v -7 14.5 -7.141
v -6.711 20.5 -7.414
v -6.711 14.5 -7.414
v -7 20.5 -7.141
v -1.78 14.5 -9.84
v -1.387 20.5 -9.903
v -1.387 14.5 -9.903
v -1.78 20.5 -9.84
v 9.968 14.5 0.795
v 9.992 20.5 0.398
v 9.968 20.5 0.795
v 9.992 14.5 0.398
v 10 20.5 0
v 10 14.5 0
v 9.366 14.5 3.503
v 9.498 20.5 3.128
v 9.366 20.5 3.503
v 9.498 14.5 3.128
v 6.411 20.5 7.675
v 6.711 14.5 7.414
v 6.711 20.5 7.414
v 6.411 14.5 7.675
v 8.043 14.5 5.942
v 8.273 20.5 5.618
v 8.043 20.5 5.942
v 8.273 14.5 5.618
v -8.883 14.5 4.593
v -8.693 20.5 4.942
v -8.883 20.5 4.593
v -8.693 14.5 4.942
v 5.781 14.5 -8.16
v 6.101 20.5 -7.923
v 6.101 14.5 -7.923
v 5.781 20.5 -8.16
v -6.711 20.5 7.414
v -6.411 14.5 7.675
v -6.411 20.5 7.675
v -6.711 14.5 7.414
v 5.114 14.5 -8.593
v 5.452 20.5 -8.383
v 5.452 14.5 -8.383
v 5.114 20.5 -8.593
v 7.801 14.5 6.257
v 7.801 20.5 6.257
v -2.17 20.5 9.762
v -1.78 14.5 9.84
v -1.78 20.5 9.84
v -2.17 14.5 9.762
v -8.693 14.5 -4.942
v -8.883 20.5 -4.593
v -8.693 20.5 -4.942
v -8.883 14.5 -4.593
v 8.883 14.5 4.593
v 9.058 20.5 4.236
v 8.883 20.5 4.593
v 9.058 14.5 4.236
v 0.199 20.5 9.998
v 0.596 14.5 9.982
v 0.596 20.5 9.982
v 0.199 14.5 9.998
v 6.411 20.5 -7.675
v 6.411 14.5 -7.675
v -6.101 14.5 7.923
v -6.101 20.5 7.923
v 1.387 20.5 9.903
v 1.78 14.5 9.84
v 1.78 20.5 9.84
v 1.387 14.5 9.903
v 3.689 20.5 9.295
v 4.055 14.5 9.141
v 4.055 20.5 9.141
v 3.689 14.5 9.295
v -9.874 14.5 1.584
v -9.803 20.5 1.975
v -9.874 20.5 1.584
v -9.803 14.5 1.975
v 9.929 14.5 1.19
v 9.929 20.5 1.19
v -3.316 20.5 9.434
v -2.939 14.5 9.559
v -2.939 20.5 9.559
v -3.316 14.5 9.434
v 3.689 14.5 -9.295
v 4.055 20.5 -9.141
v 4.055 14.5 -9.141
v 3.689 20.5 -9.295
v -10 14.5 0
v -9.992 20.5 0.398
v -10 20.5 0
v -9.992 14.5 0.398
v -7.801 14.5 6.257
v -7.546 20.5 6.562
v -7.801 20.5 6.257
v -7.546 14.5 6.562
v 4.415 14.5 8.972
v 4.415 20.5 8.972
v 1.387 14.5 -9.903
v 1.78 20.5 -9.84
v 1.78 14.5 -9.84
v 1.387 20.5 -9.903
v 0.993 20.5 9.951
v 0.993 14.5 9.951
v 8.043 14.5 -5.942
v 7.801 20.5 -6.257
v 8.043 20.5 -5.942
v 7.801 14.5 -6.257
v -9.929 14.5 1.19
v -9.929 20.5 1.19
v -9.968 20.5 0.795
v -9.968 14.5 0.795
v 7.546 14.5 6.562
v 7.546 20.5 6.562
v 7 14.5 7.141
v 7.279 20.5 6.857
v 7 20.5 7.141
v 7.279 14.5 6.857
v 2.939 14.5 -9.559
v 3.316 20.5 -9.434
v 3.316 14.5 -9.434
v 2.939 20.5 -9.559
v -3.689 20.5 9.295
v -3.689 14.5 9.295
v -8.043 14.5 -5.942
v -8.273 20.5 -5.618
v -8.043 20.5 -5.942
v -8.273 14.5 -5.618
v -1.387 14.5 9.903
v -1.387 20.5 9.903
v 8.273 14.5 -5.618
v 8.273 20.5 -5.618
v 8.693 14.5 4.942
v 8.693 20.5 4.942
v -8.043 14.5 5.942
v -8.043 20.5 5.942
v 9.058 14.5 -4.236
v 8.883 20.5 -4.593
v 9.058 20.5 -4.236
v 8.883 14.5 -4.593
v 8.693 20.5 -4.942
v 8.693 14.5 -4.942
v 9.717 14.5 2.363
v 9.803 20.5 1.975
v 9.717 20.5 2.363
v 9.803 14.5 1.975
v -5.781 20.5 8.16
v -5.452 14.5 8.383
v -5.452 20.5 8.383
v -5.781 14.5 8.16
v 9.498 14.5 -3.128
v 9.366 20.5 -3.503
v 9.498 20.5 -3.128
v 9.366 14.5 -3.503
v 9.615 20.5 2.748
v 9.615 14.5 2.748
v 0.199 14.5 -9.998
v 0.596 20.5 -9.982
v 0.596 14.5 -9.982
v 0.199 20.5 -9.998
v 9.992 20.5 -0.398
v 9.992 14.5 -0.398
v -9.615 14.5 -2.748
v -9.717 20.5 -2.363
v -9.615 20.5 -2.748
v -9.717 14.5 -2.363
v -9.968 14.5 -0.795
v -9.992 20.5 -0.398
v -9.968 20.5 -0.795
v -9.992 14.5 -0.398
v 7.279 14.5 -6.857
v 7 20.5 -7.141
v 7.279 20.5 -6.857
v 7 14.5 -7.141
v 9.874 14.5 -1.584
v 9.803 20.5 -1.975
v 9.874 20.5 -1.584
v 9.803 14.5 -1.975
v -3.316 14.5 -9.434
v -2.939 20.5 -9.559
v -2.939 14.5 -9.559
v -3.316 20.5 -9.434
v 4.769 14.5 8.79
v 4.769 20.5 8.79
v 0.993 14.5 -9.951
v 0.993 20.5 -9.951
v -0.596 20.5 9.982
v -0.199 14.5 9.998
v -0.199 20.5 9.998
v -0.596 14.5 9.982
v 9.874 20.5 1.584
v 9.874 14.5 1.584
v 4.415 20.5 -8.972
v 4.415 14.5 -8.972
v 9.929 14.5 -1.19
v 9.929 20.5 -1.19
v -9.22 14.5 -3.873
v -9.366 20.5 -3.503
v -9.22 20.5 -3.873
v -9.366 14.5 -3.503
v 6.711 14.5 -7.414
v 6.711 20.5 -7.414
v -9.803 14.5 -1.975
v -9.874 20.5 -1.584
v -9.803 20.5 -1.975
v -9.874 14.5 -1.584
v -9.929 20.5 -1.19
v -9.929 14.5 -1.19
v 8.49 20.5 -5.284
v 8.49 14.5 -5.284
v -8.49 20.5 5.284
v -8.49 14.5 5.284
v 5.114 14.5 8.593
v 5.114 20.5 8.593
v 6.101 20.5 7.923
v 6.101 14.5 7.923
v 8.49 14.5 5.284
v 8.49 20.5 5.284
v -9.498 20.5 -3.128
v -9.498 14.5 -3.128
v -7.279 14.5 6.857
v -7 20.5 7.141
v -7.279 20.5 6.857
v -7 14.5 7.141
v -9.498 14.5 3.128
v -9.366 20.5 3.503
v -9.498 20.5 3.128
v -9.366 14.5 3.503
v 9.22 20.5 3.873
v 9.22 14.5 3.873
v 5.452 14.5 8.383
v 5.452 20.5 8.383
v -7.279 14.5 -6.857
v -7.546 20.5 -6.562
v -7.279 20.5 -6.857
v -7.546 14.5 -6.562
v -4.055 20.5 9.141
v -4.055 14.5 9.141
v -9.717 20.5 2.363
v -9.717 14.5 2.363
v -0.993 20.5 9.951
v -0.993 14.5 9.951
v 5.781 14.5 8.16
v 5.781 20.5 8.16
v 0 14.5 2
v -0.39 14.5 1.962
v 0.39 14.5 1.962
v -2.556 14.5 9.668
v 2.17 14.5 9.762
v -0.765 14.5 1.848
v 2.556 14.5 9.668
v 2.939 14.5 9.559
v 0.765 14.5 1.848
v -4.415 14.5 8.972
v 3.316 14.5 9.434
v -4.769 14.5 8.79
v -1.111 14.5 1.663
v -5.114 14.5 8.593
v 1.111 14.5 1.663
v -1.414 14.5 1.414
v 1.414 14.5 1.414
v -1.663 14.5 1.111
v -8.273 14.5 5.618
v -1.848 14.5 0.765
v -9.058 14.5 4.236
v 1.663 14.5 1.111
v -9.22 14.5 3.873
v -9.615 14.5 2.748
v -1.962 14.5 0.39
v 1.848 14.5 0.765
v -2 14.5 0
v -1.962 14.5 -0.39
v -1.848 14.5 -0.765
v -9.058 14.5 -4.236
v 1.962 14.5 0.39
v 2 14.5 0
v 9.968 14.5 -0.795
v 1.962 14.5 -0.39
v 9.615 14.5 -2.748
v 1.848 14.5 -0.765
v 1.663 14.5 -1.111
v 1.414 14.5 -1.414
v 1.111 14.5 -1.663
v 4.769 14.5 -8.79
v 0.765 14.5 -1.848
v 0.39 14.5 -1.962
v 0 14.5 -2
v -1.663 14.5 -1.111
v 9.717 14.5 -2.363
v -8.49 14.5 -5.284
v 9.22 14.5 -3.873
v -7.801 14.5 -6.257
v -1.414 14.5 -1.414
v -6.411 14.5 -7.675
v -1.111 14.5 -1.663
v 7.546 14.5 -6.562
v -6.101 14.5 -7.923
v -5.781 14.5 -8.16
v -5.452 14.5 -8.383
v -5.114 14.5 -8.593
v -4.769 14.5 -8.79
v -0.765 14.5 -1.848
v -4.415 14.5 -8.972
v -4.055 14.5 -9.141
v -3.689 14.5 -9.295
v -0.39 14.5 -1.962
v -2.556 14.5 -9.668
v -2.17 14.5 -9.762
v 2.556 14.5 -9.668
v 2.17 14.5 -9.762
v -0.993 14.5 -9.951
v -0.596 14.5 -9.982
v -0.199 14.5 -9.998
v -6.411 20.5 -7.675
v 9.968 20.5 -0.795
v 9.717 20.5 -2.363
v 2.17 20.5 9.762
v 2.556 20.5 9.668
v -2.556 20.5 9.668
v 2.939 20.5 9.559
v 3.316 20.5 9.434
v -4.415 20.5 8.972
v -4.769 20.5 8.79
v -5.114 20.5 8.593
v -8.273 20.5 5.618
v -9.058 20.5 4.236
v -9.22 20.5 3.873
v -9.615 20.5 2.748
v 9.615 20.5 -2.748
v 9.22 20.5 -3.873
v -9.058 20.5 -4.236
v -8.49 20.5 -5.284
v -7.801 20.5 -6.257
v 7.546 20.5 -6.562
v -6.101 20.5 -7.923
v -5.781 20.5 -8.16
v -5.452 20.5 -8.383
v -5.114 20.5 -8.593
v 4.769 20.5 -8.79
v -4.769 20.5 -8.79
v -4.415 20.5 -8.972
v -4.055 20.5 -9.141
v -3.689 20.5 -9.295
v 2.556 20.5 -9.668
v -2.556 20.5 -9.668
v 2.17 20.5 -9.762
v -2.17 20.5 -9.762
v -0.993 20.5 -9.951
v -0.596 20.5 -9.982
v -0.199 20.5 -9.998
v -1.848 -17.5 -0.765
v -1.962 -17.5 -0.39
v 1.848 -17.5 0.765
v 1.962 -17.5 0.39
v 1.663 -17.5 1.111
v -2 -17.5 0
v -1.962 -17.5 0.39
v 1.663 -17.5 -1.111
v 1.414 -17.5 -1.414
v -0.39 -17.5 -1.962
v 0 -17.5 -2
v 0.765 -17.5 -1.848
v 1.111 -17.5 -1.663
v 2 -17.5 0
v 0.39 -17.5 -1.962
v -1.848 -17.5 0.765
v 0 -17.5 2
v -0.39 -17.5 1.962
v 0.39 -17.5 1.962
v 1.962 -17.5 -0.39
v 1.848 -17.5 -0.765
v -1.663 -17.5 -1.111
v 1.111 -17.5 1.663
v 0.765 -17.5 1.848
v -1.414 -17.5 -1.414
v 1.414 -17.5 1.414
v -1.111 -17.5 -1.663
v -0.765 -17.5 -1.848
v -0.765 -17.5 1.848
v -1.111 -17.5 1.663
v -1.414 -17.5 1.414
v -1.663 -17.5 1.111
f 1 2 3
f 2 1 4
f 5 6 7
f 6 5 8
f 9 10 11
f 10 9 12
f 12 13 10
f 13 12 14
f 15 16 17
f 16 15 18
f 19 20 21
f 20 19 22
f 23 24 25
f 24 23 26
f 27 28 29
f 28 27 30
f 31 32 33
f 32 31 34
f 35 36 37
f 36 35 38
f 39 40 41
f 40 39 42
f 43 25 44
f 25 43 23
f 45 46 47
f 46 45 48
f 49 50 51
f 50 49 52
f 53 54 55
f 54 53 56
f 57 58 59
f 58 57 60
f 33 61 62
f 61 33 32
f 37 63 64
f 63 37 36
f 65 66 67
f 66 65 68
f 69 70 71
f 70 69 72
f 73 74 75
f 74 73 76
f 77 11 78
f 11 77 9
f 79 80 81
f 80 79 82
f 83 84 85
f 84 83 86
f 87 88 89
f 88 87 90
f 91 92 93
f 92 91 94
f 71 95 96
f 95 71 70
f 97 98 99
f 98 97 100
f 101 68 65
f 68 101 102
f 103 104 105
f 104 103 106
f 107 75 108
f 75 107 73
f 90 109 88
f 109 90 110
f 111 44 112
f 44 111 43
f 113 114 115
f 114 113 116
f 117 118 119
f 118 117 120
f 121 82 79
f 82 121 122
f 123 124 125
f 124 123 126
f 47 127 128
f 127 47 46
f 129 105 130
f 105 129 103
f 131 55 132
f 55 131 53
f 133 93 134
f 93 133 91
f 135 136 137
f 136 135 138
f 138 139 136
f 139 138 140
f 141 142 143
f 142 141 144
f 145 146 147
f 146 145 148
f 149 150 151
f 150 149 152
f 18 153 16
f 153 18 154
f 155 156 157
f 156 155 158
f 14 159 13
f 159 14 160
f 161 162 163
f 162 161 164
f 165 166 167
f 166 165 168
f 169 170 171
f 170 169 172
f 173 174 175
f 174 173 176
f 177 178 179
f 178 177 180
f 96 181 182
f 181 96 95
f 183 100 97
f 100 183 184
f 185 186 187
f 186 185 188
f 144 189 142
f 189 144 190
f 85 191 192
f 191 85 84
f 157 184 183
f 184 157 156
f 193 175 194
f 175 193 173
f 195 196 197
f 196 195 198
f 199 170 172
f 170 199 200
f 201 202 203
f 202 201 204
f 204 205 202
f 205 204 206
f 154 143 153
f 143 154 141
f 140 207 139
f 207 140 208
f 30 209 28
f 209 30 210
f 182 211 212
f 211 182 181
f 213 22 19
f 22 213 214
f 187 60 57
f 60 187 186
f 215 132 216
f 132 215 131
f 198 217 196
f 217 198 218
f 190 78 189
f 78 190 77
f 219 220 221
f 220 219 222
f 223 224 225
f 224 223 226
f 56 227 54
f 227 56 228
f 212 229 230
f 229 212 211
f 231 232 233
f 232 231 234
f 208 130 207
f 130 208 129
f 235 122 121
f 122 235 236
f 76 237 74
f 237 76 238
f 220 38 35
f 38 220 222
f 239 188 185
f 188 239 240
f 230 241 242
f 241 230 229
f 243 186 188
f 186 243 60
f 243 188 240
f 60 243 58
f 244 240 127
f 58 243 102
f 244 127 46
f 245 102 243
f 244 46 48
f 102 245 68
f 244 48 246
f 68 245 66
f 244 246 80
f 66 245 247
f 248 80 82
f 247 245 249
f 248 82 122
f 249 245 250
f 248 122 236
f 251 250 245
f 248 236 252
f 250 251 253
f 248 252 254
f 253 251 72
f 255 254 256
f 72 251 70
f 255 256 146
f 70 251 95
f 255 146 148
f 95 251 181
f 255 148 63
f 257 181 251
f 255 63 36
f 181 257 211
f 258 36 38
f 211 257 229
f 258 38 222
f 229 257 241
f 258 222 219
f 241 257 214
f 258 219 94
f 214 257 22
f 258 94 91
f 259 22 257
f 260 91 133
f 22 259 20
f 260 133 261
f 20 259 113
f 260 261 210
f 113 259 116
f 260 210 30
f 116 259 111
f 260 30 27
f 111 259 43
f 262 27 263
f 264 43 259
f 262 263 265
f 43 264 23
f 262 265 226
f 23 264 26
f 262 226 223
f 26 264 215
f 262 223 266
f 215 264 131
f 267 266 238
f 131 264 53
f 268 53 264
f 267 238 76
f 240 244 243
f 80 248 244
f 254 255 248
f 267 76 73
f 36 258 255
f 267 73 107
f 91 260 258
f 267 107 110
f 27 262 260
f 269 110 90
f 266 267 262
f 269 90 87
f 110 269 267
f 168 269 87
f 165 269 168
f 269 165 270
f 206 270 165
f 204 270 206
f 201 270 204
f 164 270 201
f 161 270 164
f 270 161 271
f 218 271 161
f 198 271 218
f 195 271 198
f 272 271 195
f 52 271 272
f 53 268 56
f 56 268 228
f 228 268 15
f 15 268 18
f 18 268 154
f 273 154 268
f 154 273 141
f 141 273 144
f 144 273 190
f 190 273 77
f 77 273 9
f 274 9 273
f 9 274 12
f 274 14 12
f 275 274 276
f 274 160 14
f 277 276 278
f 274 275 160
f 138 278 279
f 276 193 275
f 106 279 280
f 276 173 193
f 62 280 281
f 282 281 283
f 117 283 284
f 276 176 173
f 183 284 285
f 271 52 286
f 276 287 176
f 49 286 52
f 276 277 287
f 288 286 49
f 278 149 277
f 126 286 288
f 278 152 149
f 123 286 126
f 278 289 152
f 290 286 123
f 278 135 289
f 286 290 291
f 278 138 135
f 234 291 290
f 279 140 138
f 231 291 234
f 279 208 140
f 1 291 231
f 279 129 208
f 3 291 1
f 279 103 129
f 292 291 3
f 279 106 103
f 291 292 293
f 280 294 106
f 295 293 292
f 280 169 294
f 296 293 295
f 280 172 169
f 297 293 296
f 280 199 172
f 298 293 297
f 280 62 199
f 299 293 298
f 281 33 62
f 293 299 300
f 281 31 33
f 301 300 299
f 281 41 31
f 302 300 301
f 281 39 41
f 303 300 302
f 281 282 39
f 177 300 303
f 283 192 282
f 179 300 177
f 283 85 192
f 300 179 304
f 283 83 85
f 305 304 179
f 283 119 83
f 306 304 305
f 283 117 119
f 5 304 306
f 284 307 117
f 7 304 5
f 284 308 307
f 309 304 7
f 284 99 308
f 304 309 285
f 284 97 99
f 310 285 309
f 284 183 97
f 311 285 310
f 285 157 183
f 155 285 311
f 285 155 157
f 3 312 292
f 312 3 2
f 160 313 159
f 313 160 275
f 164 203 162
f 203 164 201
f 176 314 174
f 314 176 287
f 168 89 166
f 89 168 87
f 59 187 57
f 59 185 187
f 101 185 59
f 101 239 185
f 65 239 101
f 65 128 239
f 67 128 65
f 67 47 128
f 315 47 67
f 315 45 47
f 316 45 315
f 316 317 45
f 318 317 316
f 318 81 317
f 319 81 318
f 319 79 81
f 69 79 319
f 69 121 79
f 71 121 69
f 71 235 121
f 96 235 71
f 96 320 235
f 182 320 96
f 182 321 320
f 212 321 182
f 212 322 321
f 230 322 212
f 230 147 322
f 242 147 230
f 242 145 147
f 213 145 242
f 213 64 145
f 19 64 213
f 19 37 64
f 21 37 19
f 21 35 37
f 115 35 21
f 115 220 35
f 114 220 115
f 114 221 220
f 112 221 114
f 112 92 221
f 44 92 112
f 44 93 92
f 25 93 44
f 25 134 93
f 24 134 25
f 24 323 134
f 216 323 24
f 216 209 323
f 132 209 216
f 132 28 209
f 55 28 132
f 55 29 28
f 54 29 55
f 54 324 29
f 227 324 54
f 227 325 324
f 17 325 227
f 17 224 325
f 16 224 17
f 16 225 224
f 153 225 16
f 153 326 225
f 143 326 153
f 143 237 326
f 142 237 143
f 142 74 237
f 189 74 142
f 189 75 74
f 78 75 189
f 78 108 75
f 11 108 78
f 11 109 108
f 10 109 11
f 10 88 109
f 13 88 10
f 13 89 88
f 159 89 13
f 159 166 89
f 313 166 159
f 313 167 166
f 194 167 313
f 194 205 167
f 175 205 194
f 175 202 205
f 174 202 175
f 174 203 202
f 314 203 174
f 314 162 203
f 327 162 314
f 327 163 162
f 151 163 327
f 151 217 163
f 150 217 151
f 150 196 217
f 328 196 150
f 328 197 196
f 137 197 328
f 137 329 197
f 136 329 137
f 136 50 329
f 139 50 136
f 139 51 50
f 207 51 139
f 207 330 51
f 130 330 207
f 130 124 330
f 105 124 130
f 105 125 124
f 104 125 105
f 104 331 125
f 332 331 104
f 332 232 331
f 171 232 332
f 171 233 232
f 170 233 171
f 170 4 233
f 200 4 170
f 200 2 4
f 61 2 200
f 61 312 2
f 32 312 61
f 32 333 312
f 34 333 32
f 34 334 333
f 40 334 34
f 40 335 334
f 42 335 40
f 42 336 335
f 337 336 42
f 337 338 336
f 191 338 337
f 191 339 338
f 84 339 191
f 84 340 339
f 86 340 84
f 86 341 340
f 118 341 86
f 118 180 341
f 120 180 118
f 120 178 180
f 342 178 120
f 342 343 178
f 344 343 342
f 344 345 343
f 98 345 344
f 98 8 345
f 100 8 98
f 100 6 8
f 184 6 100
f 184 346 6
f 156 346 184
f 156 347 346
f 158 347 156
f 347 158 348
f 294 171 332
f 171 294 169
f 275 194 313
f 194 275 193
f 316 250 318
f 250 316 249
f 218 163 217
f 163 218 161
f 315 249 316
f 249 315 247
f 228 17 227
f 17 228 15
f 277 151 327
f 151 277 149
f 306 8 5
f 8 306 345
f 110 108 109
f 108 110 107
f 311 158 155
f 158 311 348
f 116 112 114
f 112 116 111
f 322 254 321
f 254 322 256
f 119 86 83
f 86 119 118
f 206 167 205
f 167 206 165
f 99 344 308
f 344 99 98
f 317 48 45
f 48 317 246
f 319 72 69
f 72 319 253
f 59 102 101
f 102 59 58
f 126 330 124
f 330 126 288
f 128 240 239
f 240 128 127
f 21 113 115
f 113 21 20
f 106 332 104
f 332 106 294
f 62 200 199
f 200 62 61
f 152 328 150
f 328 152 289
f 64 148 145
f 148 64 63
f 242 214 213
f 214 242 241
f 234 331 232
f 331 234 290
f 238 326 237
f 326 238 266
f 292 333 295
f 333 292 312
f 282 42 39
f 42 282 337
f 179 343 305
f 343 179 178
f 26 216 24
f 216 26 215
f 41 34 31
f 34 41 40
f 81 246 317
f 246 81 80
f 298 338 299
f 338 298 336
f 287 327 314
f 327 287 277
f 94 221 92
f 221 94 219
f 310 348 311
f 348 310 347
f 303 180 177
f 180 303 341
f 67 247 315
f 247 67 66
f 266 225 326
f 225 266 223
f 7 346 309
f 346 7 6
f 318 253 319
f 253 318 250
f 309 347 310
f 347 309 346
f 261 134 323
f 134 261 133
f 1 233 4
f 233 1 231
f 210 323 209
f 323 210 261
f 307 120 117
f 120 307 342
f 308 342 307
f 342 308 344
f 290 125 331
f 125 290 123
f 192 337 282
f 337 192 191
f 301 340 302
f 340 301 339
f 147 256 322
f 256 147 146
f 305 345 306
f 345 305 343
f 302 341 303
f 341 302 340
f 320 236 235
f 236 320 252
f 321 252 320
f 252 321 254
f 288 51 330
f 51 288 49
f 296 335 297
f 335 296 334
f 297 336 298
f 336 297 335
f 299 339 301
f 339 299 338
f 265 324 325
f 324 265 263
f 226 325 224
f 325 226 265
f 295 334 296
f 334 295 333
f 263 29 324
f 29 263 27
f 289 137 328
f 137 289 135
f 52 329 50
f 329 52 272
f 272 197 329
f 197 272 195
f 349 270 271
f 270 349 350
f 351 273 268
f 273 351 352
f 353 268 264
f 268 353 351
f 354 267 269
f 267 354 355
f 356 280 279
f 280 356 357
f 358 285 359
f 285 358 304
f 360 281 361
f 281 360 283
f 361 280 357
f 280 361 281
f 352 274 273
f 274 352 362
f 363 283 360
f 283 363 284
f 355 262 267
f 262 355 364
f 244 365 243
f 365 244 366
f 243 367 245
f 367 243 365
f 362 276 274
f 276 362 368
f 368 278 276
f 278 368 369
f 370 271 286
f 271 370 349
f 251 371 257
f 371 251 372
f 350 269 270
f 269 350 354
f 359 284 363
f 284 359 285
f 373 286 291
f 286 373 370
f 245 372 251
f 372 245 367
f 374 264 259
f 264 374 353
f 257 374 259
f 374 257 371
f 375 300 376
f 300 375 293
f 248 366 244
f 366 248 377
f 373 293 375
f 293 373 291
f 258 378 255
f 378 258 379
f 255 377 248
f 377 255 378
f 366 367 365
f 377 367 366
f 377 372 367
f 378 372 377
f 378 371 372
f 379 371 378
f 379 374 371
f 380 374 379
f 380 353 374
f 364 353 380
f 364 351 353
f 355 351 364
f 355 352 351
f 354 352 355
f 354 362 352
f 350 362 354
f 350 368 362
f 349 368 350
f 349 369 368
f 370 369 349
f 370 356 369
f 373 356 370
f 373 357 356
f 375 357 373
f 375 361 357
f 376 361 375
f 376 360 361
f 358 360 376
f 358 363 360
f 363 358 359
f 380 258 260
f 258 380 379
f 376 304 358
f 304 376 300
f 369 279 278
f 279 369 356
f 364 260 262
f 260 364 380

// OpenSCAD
// file: vehicle_parts.scad
module simple_wheel(wheel_radius=10, wheel_width=6) {
    rotate([90,0,0])
        cylinder(h=wheel_width,r=wheel_radius,center=true);
}

module complex_wheel(wheel_radius=10, side_spheres_radius=50, hub_thickness=4, cylinder_radius=2) {
    cylinder_height=2*wheel_radius;  
    difference() {  
        // Wheel sphere  
        sphere(r=wheel_radius);  
        // Side sphere 1  
        translate([0,side_spheres_radius + hub_thickness/2,0])
            sphere(r=side_spheres_radius);  
        // Side sphere 2  
        translate([0,- (side_spheres_radius + hub_thickness/2),0])
            sphere(r=side_spheres_radius);  
        // Cylinder 1  
        translate([wheel_radius/2,0,0])
            rotate([90,0,0])
            cylinder(h=cylinder_height,r=cylinder_radius,center=true);  
        // Cylinder 2  
        translate([0,0,wheel_radius/2])
            rotate([90,0,0])
            cylinder(h=cylinder_height,r=cylinder_radius,center=true);  
        // Cylinder 3  
        translate([-wheel_radius/2,0,0])
            rotate([90,0,0])
            cylinder(h=cylinder_height,r=cylinder_radius,center=true);  
        // Cylinder 4  
        translate([0,0,-wheel_radius/2])
            rotate([90,0,0])
            cylinder(h=cylinder_height,r=cylinder_radius,center=true);  
    }
}

module body(base_height=10, top_height=14, base_length=60, top_length=30, width=20, top_offset=5) {
    // Car body base
    cube([base_length,width,base_height],center=true);
    // Car body top
    translate([top_offset,0,base_height/2+top_height/2 - 0.001])
        cube([top_length,width,top_height],center=true);
}

module axle(track=35, radius=2) {
    rotate([90,0,0])
        cylinder(h=track,r=2,center=true);
}
// main file
use <vehicle_parts.scad>
$fa = 1;
$fs = 0.4;
module axle_wheelset(track=35, radius=2) {
    translate([0,track/2,0])
        children(0);
    axle(track=track, radius=radius);
    translate([0,-track/2,0])
        children(1);
}
axle_wheelset(){
    simple_wheel();
}
